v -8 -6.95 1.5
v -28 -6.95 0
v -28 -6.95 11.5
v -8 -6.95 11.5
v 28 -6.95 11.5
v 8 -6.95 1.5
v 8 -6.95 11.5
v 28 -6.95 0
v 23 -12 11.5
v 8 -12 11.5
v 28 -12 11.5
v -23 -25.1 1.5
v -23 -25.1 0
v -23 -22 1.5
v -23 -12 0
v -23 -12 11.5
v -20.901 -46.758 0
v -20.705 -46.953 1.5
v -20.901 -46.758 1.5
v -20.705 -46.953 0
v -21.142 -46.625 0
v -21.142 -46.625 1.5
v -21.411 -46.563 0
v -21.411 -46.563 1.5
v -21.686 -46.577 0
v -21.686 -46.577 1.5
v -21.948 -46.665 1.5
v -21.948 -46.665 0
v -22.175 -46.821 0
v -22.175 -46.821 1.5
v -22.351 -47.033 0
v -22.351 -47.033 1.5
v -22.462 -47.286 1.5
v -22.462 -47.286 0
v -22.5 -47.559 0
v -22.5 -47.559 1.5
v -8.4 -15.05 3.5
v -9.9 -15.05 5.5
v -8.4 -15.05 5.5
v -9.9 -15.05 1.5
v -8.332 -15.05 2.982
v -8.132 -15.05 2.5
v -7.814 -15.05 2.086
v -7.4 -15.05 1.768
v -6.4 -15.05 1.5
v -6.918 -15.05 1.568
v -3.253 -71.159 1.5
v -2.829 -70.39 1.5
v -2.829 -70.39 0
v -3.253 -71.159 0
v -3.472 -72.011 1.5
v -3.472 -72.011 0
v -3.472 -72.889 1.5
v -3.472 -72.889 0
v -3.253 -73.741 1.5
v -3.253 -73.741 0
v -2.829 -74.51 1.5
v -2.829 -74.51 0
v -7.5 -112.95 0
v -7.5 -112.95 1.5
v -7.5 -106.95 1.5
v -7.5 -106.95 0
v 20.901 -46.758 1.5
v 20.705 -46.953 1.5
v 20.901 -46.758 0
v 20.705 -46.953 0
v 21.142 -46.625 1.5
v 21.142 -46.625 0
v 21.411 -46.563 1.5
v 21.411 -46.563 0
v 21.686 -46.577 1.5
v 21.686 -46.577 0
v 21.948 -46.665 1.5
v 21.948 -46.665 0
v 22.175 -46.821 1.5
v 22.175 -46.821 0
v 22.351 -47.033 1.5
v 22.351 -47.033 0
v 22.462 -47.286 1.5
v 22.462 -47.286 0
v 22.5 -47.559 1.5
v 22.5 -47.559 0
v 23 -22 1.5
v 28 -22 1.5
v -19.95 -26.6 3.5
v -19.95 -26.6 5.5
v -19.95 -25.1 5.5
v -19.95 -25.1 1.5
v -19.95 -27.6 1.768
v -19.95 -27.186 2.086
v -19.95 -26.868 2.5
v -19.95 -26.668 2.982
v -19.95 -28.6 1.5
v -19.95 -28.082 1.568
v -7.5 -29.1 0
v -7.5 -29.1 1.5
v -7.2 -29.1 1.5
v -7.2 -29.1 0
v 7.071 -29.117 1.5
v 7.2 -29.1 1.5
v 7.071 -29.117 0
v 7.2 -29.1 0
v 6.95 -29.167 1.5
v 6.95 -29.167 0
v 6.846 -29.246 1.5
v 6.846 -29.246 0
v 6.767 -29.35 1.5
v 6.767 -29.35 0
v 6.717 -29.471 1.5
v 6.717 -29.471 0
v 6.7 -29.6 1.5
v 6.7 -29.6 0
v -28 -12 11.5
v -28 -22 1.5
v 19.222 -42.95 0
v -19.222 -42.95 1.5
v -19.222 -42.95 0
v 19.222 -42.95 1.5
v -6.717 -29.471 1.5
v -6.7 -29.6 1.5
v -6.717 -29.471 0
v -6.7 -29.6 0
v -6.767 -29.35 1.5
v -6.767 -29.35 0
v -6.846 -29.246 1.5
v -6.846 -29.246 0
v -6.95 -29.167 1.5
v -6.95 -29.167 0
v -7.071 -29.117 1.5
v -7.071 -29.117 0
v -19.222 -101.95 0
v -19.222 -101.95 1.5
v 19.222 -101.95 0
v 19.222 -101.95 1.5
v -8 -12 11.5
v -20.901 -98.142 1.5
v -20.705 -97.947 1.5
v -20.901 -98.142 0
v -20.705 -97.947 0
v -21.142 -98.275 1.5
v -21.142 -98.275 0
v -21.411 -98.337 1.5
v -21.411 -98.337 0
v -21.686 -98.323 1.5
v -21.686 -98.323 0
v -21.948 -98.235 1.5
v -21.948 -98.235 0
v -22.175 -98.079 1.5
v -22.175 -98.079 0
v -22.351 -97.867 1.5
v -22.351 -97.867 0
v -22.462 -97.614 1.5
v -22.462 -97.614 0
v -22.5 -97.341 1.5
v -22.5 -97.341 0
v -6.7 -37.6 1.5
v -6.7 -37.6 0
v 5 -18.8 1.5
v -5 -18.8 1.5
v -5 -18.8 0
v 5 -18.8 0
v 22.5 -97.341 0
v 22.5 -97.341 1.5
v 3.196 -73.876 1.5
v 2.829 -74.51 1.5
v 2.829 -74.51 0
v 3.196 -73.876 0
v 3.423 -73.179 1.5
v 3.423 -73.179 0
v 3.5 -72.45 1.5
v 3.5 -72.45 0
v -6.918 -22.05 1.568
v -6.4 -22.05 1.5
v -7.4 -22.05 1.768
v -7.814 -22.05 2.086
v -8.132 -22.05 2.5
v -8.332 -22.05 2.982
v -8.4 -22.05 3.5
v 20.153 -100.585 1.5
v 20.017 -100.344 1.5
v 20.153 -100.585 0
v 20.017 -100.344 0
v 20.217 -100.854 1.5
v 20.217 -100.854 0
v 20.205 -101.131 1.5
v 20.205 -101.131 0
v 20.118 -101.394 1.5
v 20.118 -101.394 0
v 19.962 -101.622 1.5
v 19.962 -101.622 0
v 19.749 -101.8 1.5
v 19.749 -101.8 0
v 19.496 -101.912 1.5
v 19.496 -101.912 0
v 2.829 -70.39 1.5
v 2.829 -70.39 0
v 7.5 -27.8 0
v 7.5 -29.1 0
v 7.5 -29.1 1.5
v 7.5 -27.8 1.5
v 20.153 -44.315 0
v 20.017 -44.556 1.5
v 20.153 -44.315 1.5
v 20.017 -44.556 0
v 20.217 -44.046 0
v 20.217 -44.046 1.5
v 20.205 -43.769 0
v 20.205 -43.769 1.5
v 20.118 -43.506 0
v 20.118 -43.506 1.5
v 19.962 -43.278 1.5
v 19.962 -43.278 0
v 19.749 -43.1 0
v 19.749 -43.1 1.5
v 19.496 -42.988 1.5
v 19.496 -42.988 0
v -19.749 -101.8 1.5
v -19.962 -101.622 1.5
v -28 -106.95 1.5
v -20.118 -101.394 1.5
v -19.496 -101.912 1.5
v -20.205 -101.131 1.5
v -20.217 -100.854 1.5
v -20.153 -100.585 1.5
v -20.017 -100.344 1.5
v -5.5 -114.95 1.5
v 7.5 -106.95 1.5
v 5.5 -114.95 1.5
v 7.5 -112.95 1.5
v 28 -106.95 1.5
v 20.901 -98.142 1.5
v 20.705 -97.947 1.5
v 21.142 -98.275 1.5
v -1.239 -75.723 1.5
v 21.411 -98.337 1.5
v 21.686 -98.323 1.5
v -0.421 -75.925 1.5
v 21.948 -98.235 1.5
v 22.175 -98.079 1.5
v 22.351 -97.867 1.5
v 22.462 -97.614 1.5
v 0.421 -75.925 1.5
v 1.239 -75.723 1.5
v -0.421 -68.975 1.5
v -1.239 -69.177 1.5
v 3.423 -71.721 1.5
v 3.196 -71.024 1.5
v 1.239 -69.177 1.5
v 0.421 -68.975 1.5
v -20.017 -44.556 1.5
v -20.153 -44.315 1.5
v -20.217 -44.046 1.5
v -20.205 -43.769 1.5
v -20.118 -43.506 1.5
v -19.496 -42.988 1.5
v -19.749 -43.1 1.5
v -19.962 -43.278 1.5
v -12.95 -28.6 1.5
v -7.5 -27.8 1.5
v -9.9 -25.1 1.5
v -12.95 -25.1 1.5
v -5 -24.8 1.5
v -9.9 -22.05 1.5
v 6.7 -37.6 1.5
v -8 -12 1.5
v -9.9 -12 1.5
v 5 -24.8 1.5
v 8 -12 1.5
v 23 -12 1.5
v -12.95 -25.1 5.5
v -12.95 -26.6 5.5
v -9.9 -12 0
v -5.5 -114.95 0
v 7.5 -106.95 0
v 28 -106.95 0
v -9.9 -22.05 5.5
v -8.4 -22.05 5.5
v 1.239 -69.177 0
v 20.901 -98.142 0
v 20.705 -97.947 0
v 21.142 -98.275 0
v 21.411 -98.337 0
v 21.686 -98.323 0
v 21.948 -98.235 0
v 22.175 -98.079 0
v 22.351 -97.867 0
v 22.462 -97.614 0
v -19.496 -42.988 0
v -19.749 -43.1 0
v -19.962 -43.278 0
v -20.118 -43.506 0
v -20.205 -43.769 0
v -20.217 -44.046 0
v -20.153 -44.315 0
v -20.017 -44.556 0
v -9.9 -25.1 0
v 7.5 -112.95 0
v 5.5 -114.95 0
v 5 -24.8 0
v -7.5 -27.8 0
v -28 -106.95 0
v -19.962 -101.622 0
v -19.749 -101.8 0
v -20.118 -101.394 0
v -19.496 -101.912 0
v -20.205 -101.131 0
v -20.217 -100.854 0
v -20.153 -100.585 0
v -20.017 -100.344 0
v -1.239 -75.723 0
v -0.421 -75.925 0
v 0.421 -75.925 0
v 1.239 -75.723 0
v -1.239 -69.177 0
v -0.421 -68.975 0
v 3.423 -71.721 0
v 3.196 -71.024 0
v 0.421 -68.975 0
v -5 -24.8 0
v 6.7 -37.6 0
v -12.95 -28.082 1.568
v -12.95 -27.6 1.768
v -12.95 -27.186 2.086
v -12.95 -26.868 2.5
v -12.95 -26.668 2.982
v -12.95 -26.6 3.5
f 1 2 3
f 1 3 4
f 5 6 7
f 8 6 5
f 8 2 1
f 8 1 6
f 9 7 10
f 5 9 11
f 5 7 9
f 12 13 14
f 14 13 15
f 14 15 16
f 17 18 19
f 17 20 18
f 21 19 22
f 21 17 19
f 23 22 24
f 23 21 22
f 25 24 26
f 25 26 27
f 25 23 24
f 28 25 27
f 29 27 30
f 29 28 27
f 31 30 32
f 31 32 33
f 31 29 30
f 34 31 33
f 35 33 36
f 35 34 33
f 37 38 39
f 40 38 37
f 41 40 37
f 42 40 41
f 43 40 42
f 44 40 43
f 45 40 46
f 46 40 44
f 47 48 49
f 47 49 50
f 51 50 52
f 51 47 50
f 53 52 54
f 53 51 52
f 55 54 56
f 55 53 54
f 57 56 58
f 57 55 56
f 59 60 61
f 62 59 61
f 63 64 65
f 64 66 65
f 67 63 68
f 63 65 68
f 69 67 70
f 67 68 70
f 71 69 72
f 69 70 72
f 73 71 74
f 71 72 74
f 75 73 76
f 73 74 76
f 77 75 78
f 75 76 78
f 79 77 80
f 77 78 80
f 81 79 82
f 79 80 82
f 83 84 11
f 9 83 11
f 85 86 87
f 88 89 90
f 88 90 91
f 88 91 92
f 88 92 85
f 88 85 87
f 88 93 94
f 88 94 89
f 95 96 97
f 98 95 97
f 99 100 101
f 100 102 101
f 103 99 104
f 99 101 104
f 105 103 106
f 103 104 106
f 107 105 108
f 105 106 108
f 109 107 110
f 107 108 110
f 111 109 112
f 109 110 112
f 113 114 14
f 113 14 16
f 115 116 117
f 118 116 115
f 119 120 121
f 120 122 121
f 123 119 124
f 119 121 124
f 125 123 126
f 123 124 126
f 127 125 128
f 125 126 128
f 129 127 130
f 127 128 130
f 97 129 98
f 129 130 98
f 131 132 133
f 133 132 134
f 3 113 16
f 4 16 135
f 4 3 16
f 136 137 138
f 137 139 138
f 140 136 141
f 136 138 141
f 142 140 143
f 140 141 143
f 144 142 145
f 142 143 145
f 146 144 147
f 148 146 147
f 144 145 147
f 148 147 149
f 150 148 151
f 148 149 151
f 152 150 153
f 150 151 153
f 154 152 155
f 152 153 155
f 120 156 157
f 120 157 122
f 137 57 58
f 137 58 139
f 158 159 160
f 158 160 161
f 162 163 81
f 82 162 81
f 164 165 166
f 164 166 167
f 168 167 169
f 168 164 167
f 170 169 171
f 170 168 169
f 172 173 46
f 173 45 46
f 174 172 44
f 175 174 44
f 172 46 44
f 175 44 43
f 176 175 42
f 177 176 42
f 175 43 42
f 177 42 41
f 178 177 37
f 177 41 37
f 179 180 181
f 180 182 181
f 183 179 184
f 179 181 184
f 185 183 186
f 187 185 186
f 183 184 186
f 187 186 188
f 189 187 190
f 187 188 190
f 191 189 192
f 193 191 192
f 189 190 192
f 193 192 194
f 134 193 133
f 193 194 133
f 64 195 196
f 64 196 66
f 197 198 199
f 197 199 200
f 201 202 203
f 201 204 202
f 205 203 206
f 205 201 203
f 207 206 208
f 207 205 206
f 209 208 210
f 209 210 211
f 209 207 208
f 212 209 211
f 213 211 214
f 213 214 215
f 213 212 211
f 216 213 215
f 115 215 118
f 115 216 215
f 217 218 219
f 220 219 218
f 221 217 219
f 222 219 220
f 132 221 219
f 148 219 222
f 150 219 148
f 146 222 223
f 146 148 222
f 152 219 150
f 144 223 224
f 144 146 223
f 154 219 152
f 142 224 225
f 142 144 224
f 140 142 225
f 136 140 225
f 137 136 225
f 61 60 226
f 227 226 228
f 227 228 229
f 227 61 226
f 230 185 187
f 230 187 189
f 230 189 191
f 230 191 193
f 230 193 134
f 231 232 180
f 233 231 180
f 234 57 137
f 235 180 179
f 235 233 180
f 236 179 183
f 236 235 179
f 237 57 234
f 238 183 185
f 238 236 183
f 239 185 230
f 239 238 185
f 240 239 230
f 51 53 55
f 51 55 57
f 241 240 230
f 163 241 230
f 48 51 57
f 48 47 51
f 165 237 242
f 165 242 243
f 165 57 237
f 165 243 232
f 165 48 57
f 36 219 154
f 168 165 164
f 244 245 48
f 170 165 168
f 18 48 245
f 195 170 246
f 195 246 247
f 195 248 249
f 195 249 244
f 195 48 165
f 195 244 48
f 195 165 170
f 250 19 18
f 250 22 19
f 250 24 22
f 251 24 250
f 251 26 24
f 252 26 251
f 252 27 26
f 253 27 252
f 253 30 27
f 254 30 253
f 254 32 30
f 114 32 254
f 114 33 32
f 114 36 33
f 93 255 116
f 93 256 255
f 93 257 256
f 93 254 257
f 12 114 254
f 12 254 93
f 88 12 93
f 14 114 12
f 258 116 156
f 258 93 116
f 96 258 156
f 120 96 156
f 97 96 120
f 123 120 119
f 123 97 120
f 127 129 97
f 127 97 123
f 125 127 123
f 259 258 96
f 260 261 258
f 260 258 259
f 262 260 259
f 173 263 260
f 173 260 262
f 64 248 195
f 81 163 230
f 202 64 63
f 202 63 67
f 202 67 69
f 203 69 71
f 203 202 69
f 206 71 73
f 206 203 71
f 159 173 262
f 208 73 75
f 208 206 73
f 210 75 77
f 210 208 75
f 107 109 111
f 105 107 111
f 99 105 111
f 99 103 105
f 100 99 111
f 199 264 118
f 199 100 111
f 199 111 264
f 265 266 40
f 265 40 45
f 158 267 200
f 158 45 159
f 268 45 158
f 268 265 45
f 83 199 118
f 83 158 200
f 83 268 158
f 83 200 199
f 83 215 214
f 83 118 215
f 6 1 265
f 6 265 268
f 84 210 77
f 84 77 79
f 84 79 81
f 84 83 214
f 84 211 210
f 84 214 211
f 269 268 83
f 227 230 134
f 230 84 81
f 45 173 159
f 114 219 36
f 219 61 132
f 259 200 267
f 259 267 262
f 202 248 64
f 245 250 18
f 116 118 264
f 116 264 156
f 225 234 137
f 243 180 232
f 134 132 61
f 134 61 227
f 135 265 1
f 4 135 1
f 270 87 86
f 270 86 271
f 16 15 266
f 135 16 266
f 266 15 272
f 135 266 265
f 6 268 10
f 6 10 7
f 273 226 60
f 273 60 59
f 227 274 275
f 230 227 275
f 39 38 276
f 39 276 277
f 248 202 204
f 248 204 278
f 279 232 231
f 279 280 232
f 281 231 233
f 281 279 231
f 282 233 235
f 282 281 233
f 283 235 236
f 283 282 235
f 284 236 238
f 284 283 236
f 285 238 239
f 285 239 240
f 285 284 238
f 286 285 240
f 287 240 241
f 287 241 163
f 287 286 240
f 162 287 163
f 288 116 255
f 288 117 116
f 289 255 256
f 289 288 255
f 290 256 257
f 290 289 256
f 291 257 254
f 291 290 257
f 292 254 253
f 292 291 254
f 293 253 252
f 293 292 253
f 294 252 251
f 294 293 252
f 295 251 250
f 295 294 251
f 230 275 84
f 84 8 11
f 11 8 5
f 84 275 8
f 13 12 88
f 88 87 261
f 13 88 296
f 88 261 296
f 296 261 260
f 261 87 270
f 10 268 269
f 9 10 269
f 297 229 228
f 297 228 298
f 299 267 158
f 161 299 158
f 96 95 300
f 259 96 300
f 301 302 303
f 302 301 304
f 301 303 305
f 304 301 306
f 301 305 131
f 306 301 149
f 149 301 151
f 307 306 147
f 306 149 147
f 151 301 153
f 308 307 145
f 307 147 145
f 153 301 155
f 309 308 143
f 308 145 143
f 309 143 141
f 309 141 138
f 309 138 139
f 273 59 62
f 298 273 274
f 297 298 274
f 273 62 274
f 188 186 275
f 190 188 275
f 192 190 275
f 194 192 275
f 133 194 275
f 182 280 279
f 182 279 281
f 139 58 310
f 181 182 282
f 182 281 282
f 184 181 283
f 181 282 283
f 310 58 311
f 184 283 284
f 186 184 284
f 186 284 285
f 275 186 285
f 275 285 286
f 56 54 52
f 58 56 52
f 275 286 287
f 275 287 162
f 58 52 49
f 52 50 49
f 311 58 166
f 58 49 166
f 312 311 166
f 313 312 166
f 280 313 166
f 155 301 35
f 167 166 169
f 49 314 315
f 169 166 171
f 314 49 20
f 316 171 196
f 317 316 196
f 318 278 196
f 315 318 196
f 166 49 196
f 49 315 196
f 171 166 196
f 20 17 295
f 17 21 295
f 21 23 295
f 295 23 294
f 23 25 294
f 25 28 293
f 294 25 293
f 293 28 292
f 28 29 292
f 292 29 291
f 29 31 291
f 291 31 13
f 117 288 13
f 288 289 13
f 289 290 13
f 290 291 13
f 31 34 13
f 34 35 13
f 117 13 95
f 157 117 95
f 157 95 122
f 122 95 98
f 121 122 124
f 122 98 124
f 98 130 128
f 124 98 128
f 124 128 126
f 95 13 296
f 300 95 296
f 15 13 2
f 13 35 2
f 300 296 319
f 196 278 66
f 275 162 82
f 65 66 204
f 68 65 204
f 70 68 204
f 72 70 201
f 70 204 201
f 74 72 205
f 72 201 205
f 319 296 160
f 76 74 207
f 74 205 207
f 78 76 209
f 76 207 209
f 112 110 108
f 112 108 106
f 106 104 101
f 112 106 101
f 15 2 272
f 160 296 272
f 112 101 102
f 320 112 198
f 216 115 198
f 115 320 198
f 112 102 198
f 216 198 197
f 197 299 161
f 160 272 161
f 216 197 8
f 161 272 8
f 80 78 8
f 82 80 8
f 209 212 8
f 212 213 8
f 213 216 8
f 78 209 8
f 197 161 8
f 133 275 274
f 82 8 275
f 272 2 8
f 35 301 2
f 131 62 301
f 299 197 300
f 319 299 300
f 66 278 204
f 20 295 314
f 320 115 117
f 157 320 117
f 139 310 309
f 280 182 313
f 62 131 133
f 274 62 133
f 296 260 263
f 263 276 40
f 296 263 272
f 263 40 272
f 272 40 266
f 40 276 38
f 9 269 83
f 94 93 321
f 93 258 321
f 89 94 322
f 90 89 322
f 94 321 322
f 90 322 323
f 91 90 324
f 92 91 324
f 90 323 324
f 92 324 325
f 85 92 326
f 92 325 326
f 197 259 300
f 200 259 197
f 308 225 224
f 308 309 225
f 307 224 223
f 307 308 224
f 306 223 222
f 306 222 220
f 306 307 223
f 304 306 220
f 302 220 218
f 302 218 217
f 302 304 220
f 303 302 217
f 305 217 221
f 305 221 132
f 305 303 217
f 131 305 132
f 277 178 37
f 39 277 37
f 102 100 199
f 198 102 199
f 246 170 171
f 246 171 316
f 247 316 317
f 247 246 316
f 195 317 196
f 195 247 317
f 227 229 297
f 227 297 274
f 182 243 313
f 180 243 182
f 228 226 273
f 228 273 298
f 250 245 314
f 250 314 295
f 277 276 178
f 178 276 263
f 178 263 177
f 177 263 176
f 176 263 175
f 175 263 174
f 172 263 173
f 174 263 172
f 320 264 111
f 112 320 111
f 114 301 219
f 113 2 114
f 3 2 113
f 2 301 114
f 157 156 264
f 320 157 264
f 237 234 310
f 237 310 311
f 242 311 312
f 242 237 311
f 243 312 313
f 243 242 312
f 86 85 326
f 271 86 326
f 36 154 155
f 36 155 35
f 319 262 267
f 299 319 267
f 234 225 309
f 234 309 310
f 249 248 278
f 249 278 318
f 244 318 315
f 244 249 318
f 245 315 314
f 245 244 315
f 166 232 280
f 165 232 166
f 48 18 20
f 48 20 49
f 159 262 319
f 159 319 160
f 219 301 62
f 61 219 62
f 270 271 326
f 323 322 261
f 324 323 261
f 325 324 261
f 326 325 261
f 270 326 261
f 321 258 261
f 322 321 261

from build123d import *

# Parameters (mm, degrees)
SKETCH1_W           = 56
SKETCH1_H           = 100
BOSS_EXTRUDE1_DEPTH = 1.5
SKETCH2_W           = 20
SKETCH2_H           = 5.05
BOSS_EXTRUDE2_DEPTH = 10
SKETCH3_W           = 13.1
SKETCH3_H           = 13.1
CUT_EXTRUDE1_DEPTH  = 112.005866962
BOSS_EXTRUDE3_DEPTH = 5
BOSS_EXTRUDE4_DEPTH = 5
SKETCH6_W           = 7
SKETCH6_H           = 1.5
SKETCH6_W_2         = 1.5
SKETCH6_H_2         = 7
BOSS_EXTRUDE5_DEPTH = 4
SKETCH7_W           = 15
SKETCH7_H           = 1.3
CUT_EXTRUDE2_DEPTH  = 112.005866962
SKETCH8_W           = 13.4
SKETCH8_H           = 8.5
SKETCH8_W_2         = 10
SKETCH8_H_2         = 6
CUT_EXTRUDE3_DEPTH  = 112.005866962
FILLET1_R           = 2
SKETCH9_W           = 15
SKETCH9_H           = 8
BOSS_EXTRUDE6_DEPTH = 1.5
CHAMFER1_SIZE       = 2
SKETCH10_W          = 45
SKETCH10_H          = 59
CUT_EXTRUDE4_DEPTH  = 4
BOSS_EXTRUDE7_DEPTH = 1.5
FILLET2_R           = 1
FILLET3_R           = 0.5


with BuildPart() as part:
    # Sketch1 → Boss-Extrude1 (new body)
    with BuildSketch(Plane.XY):
        with Locations((0, -56.95)):
            Rectangle(SKETCH1_W, SKETCH1_H)
    extrude(amount=BOSS_EXTRUDE1_DEPTH)

    # Sketch2 → Boss-Extrude2 (add)
    with BuildSketch(Plane.XY.offset(1.5)):
        with Locations((-18, -9.475)):
            Rectangle(SKETCH2_W, SKETCH2_H)
        with Locations((18, -9.475)):
            Rectangle(SKETCH2_W, SKETCH2_H)
    extrude(amount=BOSS_EXTRUDE2_DEPTH)

    # Sketch3 → Cut-Extrude1 (cut, through all)
    with BuildSketch(Plane.XY.offset(1.5)):
        with Locations((-16.45, -18.55)):
            Rectangle(SKETCH3_W, SKETCH3_H)
    extrude(amount=-CUT_EXTRUDE1_DEPTH, mode=Mode.SUBTRACT)

    # Sketch4 → Boss-Extrude3 (add)
    with BuildSketch(Plane(origin=(28, 0, 0), x_dir=(0, 0, -1), z_dir=(1, 0, 0))):
        Polygon((-11.5, -12), (-1.5, -12), (-1.5, -22), align=None)
    extrude(amount=-BOSS_EXTRUDE3_DEPTH)

    # Sketch5 → Boss-Extrude4 (add)
    with BuildSketch(Plane.ZY.offset(28)):
        Polygon((1.5, -22), (11.5, -12), (1.5, -12), align=None)
    extrude(amount=-BOSS_EXTRUDE4_DEPTH)

    # Sketch6 → Boss-Extrude5 (add)
    with BuildSketch(Plane.XY.offset(1.5)):
        with Locations((-16.45, -25.85)):
            Rectangle(SKETCH6_W, SKETCH6_H)
        with Locations((-9.15, -18.55)):
            Rectangle(SKETCH6_W_2, SKETCH6_H_2)
    extrude(amount=BOSS_EXTRUDE5_DEPTH)

    # Sketch7 → Cut-Extrude2 (cut, through all)
    with BuildSketch(Plane.XY.offset(1.5)):
        with Locations((0, -28.45)):
            Rectangle(SKETCH7_W, SKETCH7_H)
    extrude(amount=-CUT_EXTRUDE2_DEPTH, mode=Mode.SUBTRACT)

    # Sketch8 → Cut-Extrude3 (cut, through all)
    with BuildSketch(Plane.XY.offset(1.5)):
        with Locations((0, -33.35)):
            Rectangle(SKETCH8_W, SKETCH8_H)
        with Locations((0, -21.8)):
            Rectangle(SKETCH8_W_2, SKETCH8_H_2)
    extrude(amount=-CUT_EXTRUDE3_DEPTH, mode=Mode.SUBTRACT)

    # Fillet1
    fillet1_edges = [part.edges().sort_by_distance(p)[0] for p in [
        (-16.45, -26.6, 1.5),
        (-8.4, -18.55, 1.5),
    ]]
    fillet(fillet1_edges, radius=FILLET1_R)

    # Sketch9 → Boss-Extrude6 (add)
    with BuildSketch(Plane.XY.offset(1.5)):
        with Locations((0, -110.95)):
            Rectangle(SKETCH9_W, SKETCH9_H)
    extrude(amount=-BOSS_EXTRUDE6_DEPTH)

    # Chamfer1
    chamfer1_edges = [part.edges().sort_by_distance(p)[0] for p in [
        (-7.5, -114.95, 0.75),
        (7.5, -114.95, 0.75),
    ]]
    chamfer(chamfer1_edges, length=CHAMFER1_SIZE)

    # Sketch10 → Cut-Extrude4 (cut)
    with BuildSketch(Plane.XY.offset(1.5)):
        with Locations((0, -72.45)):
            Rectangle(SKETCH10_W, SKETCH10_H)
    extrude(amount=-CUT_EXTRUDE4_DEPTH, mode=Mode.SUBTRACT)

    # Sketch11 → Boss-Extrude7 (add)
    with BuildSketch(Plane.XY.offset(1.5)):
        with BuildLine():
            Line((-21.242331765, -42.95), (-22.5, -42.95))
            Line((-22.5, -42.95), (-22.5, -44.598942796))
            Line((-22.5, -44.598942796), (-2.829214626, -70.389528064))
            ThreePointArc((-2.829214626, -70.389528064), (-2.122572116, -69.667072115), (-1.238970121, -69.176629712))
            Line((-1.238970121, -69.176629712), (-21.242331765, -42.95))
        make_face()
        with BuildLine():
            Line((22.5, -42.95), (21.242331765, -42.95))
            Line((21.242331765, -42.95), (1.238970121, -69.176629712))
            ThreePointArc((1.238970121, -69.176629712), (2.122572116, -69.667072115), (2.829214626, -70.389528064))
            Line((2.829214626, -70.389528064), (22.5, -44.598942796))
            Line((22.5, -44.598942796), (22.5, -42.95))
        make_face()
        with BuildLine():
            Line((22.5, -100.301057204), (2.829214626, -74.510471936))
            ThreePointArc((2.829214626, -74.510471936), (2.122572116, -75.232927885), (1.238970121, -75.723370288))
            Line((1.238970121, -75.723370288), (21.242331765, -101.95))
            Line((21.242331765, -101.95), (22.5, -101.95))
            Line((22.5, -101.95), (22.5, -100.301057204))
        make_face()
        with BuildLine():
            Line((-2.829214626, -74.510471936), (-22.5, -100.301057204))
            Line((-22.5, -100.301057204), (-22.5, -101.95))
            Line((-22.5, -101.95), (-21.242331765, -101.95))
            Line((-21.242331765, -101.95), (-1.238970121, -75.723370288))
            ThreePointArc((-1.238970121, -75.723370288), (-2.122572116, -75.232927885), (-2.829214626, -74.510471936))
        make_face()
        with BuildLine():
            Line((-1.257668235, -72.45), (-2.829214626, -70.389528064))
            ThreePointArc((-2.829214626, -70.389528064), (-3.5, -72.45), (-2.829214626, -74.510471936))
            Line((-2.829214626, -74.510471936), (-1.257668235, -72.45))
        make_face()
        with BuildLine():
            Line((0, -70.801057204), (-1.238970121, -69.176629712))
            ThreePointArc((-1.238970121, -69.176629712), (-2.122572116, -69.667072115), (-2.829214626, -70.389528064))
            Line((-2.829214626, -70.389528064), (-1.257668235, -72.45))
            Line((-1.257668235, -72.45), (0, -70.801057204))
        make_face()
        with BuildLine():
            Line((0, -74.098942796), (-1.257668235, -72.45))
            Line((-1.257668235, -72.45), (-2.829214626, -74.510471936))
            ThreePointArc((-2.829214626, -74.510471936), (-2.122572116, -75.232927885), (-1.238970121, -75.723370288))
            Line((-1.238970121, -75.723370288), (0, -74.098942796))
        make_face()
        with BuildLine():
            Line((1.238970121, -75.723370288), (0, -74.098942796))
            Line((0, -74.098942796), (-1.238970121, -75.723370288))
            ThreePointArc((-1.238970121, -75.723370288), (0, -75.95), (1.238970121, -75.723370288))
        make_face()
        with BuildLine():
            Line((2.829214626, -70.389528064), (1.257668235, -72.45))
            Line((1.257668235, -72.45), (2.829214626, -74.510471936))
            ThreePointArc((2.829214626, -74.510471936), (3.328081369, -73.533454846), (3.5, -72.45))
            ThreePointArc((3.5, -72.45), (3.328081369, -71.366545154), (2.829214626, -70.389528064))
        make_face()
        with BuildLine():
            Line((2.829214626, -74.510471936), (1.257668235, -72.45))
            Line((1.257668235, -72.45), (0, -74.098942796))
            Line((0, -74.098942796), (1.238970121, -75.723370288))
            ThreePointArc((1.238970121, -75.723370288), (2.122572116, -75.232927885), (2.829214626, -74.510471936))
        make_face()
        with BuildLine():
            Line((1.238970121, -69.176629712), (0, -70.801057204))
            Line((0, -70.801057204), (1.257668235, -72.45))
            Line((1.257668235, -72.45), (2.829214626, -70.389528064))
            ThreePointArc((2.829214626, -70.389528064), (2.122572116, -69.667072115), (1.238970121, -69.176629712))
        make_face()
        with BuildLine():
            ThreePointArc((1.238970121, -69.176629712), (0, -68.95), (-1.238970121, -69.176629712))
            Line((-1.238970121, -69.176629712), (0, -70.801057204))
            Line((0, -70.801057204), (1.238970121, -69.176629712))
        make_face()
        Polygon((1.257668235, -72.45), (0, -70.801057204), (-1.257668235, -72.45), (0, -74.098942796), align=None)
    extrude(amount=-BOSS_EXTRUDE7_DEPTH)

    # Fillet2
    fillet2_edges = [part.edges().sort_by_distance(p)[0] for p in [
        (-22.5, -100.301057204, 0.75),
        (-21.242331765, -101.95, 0.75),
        (21.242331765, -101.95, 0.75),
        (22.5, -100.301057204, 0.75),
        (22.5, -44.598942796, 0.75),
        (21.242331765, -42.95, 0.75),
        (-21.242331765, -42.95, 0.75),
        (-22.5, -44.598942796, 0.75),
    ]]
    fillet(fillet2_edges, radius=FILLET2_R)

    # Fillet3
    fillet3_edges = [part.edges().sort_by_distance(p)[0] for p in [
        (6.7, -29.1, 0.75),
        (-6.7, -29.1, 0.75),
    ]]
    fillet(fillet3_edges, radius=FILLET3_R)


solid = part.part
